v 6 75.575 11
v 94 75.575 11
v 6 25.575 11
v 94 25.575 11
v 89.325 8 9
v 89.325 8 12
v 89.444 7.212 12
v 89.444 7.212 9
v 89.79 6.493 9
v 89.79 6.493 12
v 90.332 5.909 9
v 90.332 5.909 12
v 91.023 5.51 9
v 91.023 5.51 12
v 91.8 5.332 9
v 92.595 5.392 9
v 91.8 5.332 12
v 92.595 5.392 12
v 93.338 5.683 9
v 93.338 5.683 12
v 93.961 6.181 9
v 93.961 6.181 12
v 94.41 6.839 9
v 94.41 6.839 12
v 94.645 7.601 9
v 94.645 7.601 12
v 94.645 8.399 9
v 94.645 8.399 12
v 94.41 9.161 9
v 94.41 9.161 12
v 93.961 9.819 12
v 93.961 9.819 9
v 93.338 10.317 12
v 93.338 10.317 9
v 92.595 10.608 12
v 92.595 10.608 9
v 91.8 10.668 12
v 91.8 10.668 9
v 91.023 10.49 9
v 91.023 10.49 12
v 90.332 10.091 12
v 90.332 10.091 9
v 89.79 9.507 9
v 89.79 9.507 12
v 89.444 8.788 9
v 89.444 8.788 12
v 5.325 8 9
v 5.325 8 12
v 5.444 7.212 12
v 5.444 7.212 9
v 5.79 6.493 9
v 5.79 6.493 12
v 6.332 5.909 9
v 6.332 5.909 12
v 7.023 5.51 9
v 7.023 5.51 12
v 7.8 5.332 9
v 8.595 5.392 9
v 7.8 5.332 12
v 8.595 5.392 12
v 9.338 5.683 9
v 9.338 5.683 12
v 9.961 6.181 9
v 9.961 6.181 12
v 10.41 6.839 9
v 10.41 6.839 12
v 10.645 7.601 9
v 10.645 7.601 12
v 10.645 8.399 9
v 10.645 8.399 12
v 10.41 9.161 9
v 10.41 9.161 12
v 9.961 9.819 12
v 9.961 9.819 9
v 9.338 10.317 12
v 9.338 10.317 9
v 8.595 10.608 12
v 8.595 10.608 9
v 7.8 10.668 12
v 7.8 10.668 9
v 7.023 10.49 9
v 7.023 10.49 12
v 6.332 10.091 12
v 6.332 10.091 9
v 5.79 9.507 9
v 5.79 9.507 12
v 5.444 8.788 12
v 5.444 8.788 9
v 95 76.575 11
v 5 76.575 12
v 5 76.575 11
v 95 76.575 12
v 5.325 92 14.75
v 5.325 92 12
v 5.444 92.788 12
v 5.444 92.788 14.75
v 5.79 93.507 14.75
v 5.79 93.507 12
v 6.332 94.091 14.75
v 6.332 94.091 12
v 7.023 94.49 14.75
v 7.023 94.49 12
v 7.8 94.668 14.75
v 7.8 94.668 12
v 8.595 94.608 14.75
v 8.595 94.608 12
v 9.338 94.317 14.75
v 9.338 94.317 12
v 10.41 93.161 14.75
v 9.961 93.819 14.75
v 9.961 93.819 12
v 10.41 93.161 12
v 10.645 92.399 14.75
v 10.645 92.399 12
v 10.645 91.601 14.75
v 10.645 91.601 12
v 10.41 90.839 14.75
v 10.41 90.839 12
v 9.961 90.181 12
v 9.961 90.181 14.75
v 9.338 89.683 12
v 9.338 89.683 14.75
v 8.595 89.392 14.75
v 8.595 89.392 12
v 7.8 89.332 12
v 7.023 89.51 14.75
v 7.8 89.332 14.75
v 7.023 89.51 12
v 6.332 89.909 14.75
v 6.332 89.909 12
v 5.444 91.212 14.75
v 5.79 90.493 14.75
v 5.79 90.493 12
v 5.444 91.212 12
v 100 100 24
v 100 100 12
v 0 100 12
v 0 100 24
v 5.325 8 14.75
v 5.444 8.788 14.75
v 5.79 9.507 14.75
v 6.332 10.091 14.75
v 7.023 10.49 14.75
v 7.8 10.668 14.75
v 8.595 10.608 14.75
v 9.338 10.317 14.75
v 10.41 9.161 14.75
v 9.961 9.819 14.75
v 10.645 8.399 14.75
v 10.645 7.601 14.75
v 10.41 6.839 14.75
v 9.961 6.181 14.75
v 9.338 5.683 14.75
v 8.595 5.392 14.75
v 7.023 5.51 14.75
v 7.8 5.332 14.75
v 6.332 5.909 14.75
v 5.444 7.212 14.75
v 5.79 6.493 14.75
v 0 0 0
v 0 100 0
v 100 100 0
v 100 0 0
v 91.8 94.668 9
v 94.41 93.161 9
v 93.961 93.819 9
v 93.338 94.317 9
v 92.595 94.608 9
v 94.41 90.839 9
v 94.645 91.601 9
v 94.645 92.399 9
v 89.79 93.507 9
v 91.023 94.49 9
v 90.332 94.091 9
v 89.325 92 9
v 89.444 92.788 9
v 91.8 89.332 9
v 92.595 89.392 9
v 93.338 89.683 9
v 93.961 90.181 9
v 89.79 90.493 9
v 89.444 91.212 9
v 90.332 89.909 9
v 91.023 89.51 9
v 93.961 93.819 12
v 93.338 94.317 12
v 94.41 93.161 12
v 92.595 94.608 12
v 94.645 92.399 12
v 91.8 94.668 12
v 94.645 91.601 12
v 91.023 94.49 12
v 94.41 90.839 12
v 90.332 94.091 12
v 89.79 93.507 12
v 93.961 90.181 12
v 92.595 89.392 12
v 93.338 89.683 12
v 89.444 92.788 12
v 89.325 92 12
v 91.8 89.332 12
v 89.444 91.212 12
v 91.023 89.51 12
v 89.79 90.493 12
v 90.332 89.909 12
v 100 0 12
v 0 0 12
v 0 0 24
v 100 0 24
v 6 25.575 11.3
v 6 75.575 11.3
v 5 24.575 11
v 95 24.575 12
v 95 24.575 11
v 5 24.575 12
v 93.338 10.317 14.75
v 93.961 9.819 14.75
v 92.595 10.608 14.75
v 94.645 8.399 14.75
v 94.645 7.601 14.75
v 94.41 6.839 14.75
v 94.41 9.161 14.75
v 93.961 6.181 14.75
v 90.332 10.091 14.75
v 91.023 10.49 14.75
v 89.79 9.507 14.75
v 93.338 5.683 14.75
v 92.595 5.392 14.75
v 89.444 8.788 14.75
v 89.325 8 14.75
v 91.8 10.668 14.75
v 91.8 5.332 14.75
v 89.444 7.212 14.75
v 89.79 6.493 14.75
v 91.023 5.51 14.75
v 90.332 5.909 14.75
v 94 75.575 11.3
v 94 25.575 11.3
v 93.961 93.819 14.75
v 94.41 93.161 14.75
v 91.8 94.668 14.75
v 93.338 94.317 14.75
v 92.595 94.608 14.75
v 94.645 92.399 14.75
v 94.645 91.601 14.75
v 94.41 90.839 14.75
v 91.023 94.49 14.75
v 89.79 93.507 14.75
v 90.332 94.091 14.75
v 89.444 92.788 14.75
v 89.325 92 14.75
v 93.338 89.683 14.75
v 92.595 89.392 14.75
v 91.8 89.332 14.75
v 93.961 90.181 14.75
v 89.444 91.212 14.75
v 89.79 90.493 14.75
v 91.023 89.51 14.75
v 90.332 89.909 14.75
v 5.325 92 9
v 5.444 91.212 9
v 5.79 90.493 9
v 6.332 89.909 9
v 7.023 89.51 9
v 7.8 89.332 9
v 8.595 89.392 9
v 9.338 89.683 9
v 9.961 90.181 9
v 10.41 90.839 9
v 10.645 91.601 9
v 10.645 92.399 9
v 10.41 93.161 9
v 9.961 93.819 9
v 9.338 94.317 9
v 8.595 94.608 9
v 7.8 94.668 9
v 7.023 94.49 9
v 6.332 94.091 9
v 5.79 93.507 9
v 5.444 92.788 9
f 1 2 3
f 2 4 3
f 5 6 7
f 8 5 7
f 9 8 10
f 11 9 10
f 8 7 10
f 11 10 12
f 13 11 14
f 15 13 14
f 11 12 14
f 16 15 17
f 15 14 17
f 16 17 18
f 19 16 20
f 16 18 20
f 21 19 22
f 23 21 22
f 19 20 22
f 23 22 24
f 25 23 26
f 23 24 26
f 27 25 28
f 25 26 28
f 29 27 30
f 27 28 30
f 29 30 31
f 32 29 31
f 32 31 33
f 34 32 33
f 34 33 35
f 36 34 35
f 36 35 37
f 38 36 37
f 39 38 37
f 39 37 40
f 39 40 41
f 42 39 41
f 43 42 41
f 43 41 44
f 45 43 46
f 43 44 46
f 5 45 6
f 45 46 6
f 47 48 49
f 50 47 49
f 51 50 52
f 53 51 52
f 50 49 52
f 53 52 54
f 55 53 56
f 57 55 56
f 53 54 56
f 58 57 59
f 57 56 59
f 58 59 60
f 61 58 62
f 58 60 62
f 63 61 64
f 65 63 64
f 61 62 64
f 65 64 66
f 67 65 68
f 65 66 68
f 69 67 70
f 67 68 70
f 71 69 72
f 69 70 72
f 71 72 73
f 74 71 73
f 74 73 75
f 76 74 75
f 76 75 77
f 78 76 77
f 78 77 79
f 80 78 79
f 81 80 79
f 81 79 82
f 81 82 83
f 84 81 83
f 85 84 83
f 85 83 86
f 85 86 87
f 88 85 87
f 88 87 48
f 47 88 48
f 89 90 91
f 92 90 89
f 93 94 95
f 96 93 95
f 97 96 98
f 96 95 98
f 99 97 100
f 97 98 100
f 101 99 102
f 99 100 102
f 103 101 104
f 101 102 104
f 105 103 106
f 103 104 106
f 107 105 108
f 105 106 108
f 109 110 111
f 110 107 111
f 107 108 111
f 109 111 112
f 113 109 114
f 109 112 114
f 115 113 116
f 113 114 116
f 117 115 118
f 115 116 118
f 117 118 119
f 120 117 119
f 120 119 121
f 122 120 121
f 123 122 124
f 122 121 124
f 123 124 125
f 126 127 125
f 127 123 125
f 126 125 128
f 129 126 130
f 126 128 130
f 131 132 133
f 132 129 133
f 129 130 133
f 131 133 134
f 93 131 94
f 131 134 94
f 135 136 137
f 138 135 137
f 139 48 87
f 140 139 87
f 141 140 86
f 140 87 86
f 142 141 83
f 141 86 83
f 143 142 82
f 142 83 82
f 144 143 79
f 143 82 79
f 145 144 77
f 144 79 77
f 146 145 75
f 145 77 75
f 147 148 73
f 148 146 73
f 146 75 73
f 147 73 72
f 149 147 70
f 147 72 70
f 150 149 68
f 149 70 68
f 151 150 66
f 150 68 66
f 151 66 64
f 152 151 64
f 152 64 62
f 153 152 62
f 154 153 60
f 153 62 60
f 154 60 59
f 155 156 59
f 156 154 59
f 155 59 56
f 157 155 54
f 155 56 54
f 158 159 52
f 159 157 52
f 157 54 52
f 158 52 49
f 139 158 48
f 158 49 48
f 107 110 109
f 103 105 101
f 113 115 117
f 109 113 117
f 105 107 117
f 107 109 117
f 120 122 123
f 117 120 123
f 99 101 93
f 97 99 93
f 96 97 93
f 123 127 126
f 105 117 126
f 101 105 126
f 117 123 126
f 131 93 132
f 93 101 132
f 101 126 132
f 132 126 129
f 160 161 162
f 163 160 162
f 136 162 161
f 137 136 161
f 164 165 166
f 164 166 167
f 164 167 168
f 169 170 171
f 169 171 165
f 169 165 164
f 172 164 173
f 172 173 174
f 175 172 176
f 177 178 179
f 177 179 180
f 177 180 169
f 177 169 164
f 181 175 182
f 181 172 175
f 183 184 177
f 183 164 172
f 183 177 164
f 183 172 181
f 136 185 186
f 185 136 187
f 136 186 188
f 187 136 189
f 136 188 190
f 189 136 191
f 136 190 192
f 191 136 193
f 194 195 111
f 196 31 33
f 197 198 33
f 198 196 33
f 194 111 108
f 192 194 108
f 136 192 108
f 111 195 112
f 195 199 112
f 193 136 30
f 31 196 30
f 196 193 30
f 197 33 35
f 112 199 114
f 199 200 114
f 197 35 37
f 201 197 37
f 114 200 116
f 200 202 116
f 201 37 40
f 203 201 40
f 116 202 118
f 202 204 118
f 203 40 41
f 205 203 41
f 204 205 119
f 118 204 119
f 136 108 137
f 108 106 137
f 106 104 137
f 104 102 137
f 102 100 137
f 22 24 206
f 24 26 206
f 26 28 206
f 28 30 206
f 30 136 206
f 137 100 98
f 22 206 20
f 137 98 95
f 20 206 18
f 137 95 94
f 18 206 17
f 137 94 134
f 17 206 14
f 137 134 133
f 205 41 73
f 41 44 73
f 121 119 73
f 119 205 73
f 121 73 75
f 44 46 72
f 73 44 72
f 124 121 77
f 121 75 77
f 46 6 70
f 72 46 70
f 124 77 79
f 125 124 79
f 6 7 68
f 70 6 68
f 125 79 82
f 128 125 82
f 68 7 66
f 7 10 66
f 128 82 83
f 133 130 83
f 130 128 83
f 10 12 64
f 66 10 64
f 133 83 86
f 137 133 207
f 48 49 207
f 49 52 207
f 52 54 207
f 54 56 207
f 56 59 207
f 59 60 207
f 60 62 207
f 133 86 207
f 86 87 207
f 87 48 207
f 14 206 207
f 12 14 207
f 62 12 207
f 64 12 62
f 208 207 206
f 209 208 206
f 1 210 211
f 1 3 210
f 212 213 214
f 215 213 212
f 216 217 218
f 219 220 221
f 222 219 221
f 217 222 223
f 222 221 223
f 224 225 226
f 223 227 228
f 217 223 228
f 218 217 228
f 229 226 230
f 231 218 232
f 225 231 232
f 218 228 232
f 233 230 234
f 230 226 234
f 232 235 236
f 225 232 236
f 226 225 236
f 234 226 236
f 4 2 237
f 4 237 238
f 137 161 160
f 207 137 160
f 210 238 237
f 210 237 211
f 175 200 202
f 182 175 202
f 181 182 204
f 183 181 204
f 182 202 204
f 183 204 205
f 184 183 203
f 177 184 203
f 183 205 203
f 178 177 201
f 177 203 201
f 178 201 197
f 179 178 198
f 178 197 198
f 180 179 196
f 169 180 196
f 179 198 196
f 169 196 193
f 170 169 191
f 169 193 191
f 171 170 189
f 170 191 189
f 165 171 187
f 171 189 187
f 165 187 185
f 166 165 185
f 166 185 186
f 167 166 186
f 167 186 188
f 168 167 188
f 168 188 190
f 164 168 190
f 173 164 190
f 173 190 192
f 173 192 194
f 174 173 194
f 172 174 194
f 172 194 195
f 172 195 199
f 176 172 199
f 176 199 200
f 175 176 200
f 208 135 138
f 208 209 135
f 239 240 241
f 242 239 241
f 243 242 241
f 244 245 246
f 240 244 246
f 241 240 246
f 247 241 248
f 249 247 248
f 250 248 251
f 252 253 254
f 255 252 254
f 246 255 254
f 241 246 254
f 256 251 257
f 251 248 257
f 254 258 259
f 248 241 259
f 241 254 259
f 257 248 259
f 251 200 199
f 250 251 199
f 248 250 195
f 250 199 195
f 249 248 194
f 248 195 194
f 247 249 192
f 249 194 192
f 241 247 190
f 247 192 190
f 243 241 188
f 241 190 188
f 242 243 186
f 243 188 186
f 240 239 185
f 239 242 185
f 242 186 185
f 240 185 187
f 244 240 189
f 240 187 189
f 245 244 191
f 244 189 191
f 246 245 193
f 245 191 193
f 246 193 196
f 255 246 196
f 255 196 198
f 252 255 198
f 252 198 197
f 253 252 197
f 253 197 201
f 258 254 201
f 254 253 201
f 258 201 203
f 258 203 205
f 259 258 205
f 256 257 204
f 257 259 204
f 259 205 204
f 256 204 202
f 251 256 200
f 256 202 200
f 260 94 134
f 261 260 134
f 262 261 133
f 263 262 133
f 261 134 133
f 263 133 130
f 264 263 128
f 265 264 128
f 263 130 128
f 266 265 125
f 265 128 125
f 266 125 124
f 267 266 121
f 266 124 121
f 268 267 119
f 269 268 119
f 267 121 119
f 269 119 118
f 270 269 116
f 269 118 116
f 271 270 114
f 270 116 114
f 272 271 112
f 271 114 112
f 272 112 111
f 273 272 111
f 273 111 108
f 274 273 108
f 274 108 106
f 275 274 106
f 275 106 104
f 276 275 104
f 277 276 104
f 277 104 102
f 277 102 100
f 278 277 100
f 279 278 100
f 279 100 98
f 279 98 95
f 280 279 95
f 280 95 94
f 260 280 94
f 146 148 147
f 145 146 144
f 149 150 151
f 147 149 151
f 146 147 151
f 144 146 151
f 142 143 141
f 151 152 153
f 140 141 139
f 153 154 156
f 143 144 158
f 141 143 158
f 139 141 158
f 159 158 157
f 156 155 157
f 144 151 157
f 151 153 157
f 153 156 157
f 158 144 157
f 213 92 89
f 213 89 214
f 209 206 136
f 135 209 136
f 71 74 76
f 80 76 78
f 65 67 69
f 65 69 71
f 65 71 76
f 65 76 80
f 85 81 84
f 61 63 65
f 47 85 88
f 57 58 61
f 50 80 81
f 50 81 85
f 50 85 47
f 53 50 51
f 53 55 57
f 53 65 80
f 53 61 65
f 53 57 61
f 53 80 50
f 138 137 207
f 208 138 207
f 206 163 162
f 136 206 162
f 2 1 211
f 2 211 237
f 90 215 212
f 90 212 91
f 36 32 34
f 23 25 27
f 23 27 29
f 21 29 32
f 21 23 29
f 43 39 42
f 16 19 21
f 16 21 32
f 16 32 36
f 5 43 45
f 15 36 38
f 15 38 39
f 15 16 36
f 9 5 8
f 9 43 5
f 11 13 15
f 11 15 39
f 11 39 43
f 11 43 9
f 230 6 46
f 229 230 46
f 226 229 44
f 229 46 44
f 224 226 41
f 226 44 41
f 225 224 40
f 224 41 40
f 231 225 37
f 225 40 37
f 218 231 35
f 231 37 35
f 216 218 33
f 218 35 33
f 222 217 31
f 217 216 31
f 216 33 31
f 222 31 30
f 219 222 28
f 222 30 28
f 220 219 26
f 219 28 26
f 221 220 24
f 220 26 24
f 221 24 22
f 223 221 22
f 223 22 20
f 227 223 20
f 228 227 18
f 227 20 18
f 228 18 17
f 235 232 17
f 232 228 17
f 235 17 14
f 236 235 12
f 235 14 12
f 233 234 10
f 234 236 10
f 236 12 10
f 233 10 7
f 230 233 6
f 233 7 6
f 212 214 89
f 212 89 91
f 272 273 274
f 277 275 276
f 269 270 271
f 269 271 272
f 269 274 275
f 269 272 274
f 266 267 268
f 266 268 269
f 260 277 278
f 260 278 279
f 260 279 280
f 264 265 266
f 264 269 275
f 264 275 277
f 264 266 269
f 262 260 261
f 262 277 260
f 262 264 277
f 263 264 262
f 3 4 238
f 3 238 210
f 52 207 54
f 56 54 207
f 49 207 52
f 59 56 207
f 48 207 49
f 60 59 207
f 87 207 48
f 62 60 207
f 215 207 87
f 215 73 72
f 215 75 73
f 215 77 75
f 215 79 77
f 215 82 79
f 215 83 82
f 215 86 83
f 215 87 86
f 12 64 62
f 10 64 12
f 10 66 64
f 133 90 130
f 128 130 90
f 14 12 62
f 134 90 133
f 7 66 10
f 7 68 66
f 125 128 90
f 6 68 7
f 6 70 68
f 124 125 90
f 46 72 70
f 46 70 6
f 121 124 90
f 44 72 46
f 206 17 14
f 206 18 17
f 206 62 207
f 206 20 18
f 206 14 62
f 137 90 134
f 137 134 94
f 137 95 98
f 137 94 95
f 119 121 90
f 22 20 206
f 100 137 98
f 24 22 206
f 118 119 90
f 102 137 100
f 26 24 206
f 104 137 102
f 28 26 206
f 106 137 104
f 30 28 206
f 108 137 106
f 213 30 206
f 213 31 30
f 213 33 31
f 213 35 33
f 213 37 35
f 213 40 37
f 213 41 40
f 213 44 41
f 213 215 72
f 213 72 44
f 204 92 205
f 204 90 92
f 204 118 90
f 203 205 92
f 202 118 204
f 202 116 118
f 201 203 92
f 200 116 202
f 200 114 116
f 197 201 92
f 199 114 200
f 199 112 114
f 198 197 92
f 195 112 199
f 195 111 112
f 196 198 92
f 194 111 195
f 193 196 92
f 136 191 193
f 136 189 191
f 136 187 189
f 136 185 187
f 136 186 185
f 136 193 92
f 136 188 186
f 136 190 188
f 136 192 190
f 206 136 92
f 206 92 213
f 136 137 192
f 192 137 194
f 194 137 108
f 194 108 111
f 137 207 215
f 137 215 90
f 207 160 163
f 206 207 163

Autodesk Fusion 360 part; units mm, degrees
sketch "Sketch1" plane through (0, 0, 0) normal (0, 0, 1) x (1, 0, 0)
  line L0 (0, 0) -> (100, 0)
  line L1 (100, 0) -> (100, 100)
  line L2 (100, 100) -> (0, 100)
  line L3 (0, 100) -> (0, 0)
  dimension "d1" = 100
  dimension "d2" = 100
extrude "Extrude1" add sketch "Sketch1" along normal blind 12 makes body 1
sketch "Sketch2" plane through (0, 0, 12) normal (0, 0, 1) x (-1, 0, 0)
  line L0 (0, -100) -> (0, 0)
  line L1 (0, 0) -> (-100, 0)
  line L2 (-100, 0) -> (-100, -100)
  line L3 (-100, -100) -> (0, -100)
  line L4 (-8, -8) -> (-92, -8) construction
  line L5 (-92, -8) -> (-92, -92) construction
  line L6 (-92, -92) -> (-8, -92) construction
  line L7 (-8, -92) -> (-8, -8) construction
  circle A0 centre (-8, -92) radius 2.675
  circle A1 centre (-92, -92) radius 2.675
  circle A2 centre (-8, -8) radius 2.675
  circle A3 centre (-92, -8) radius 2.675
  line L8 (-5, -76.5746) -> (-95, -76.5746)
  line L9 (-95, -76.5746) -> (-95, -24.5746)
  line L10 (-95, -24.5746) -> (-5, -24.5746)
  line L11 (-5, -24.5746) -> (-5, -76.5746)
  dimension "d5" = -8
  dimension "d6" = 5.35
  dimension "d7" = 5.35
  dimension "d8" = 5.35
  dimension "d9" = 5.35
  dimension "d10" = 52
  dimension "d11" = 90
  dimension "d12" = 5
extrude "Extrude2" cut sketch "Sketch2" against normal blind 3 contours A0 | A1 | A2 | A3 bodies 1
extrude "Extrude3" cut sketch "Sketch2" against normal blind 1 contours L8 L9 L10 L11 bodies 1
sketch "Sketch3" plane through (0, 0, 11) normal (0, 0, 1) x (-1, 0, 0)
  line L0 (-5, -24.5746) -> (-95, -24.5746)
  line L1 (-95, -24.5746) -> (-95, -76.5746)
  line L2 (-95, -76.5746) -> (-5, -76.5746)
  line L3 (-5, -76.5746) -> (-5, -24.5746)
  line L4 (-6, -75.5746) -> (-94, -75.5746)
  line L5 (-94, -75.5746) -> (-94, -25.5746)
  line L6 (-94, -25.5746) -> (-6, -25.5746)
  line L7 (-6, -25.5746) -> (-6, -75.5746)
  dimension "d17" = 88
  dimension "d18" = 50
  dimension "d19" = 1
  dimension "d20" = 1
extrude "Extrude4" add sketch "Sketch3" along normal blind 0.3 separate body contours L4 L5 L6 L7 makes body 2
sketch "Sketch4" plane through (0, 0, 12) normal (0, 0, 1) x (-1, 0, 0)
  line L0 (-95, -76.5746) -> (-95, -24.5746)
  line L1 (-95, -24.5746) -> (-5, -24.5746)
  line L2 (-5, -24.5746) -> (-5, -76.5746)
  line L3 (-5, -76.5746) -> (-95, -76.5746)
  circle A0 centre (-92, -92) radius 2.675
  circle A1 centre (-92, -8) radius 2.675
  circle A2 centre (-8, -92) radius 2.675
  circle A3 centre (-8, -8) radius 2.675
  line L4 (0, -100) -> (0, 0)
  line L5 (0, 0) -> (-100, 0)
  line L6 (-100, 0) -> (-100, -100)
  line L7 (-100, -100) -> (0, -100)
  line L8 (0, -100) -> (-100, -100)
  line L9 (-100, -100) -> (-100, 0)
  line L10 (-100, 0) -> (0, 0)
  line L11 (0, 0) -> (0, -100)
  circle A4 centre (-8, -92) radius 2.5
  circle A5 centre (-92, -92) radius 2.5
  circle A6 centre (-92, -8) radius 2.5
  circle A7 centre (-8, -8) radius 2.5
extrude "Extrude5" add sketch "Sketch4" along normal blind 12 separate body contours L0 L1 L2 L3 | A0 | A1 | A2 | A3 | L4 L5 L6 L7 L8 L9 L10 L11 | A4 | A5 | A6 | A7 makes body 3
extrude "Extrude6" cut sketch "Sketch4" along normal blind 2.75 contours A0 | A1 | A2 | A3 | A4 | A5 | A6 | A7 bodies 3
